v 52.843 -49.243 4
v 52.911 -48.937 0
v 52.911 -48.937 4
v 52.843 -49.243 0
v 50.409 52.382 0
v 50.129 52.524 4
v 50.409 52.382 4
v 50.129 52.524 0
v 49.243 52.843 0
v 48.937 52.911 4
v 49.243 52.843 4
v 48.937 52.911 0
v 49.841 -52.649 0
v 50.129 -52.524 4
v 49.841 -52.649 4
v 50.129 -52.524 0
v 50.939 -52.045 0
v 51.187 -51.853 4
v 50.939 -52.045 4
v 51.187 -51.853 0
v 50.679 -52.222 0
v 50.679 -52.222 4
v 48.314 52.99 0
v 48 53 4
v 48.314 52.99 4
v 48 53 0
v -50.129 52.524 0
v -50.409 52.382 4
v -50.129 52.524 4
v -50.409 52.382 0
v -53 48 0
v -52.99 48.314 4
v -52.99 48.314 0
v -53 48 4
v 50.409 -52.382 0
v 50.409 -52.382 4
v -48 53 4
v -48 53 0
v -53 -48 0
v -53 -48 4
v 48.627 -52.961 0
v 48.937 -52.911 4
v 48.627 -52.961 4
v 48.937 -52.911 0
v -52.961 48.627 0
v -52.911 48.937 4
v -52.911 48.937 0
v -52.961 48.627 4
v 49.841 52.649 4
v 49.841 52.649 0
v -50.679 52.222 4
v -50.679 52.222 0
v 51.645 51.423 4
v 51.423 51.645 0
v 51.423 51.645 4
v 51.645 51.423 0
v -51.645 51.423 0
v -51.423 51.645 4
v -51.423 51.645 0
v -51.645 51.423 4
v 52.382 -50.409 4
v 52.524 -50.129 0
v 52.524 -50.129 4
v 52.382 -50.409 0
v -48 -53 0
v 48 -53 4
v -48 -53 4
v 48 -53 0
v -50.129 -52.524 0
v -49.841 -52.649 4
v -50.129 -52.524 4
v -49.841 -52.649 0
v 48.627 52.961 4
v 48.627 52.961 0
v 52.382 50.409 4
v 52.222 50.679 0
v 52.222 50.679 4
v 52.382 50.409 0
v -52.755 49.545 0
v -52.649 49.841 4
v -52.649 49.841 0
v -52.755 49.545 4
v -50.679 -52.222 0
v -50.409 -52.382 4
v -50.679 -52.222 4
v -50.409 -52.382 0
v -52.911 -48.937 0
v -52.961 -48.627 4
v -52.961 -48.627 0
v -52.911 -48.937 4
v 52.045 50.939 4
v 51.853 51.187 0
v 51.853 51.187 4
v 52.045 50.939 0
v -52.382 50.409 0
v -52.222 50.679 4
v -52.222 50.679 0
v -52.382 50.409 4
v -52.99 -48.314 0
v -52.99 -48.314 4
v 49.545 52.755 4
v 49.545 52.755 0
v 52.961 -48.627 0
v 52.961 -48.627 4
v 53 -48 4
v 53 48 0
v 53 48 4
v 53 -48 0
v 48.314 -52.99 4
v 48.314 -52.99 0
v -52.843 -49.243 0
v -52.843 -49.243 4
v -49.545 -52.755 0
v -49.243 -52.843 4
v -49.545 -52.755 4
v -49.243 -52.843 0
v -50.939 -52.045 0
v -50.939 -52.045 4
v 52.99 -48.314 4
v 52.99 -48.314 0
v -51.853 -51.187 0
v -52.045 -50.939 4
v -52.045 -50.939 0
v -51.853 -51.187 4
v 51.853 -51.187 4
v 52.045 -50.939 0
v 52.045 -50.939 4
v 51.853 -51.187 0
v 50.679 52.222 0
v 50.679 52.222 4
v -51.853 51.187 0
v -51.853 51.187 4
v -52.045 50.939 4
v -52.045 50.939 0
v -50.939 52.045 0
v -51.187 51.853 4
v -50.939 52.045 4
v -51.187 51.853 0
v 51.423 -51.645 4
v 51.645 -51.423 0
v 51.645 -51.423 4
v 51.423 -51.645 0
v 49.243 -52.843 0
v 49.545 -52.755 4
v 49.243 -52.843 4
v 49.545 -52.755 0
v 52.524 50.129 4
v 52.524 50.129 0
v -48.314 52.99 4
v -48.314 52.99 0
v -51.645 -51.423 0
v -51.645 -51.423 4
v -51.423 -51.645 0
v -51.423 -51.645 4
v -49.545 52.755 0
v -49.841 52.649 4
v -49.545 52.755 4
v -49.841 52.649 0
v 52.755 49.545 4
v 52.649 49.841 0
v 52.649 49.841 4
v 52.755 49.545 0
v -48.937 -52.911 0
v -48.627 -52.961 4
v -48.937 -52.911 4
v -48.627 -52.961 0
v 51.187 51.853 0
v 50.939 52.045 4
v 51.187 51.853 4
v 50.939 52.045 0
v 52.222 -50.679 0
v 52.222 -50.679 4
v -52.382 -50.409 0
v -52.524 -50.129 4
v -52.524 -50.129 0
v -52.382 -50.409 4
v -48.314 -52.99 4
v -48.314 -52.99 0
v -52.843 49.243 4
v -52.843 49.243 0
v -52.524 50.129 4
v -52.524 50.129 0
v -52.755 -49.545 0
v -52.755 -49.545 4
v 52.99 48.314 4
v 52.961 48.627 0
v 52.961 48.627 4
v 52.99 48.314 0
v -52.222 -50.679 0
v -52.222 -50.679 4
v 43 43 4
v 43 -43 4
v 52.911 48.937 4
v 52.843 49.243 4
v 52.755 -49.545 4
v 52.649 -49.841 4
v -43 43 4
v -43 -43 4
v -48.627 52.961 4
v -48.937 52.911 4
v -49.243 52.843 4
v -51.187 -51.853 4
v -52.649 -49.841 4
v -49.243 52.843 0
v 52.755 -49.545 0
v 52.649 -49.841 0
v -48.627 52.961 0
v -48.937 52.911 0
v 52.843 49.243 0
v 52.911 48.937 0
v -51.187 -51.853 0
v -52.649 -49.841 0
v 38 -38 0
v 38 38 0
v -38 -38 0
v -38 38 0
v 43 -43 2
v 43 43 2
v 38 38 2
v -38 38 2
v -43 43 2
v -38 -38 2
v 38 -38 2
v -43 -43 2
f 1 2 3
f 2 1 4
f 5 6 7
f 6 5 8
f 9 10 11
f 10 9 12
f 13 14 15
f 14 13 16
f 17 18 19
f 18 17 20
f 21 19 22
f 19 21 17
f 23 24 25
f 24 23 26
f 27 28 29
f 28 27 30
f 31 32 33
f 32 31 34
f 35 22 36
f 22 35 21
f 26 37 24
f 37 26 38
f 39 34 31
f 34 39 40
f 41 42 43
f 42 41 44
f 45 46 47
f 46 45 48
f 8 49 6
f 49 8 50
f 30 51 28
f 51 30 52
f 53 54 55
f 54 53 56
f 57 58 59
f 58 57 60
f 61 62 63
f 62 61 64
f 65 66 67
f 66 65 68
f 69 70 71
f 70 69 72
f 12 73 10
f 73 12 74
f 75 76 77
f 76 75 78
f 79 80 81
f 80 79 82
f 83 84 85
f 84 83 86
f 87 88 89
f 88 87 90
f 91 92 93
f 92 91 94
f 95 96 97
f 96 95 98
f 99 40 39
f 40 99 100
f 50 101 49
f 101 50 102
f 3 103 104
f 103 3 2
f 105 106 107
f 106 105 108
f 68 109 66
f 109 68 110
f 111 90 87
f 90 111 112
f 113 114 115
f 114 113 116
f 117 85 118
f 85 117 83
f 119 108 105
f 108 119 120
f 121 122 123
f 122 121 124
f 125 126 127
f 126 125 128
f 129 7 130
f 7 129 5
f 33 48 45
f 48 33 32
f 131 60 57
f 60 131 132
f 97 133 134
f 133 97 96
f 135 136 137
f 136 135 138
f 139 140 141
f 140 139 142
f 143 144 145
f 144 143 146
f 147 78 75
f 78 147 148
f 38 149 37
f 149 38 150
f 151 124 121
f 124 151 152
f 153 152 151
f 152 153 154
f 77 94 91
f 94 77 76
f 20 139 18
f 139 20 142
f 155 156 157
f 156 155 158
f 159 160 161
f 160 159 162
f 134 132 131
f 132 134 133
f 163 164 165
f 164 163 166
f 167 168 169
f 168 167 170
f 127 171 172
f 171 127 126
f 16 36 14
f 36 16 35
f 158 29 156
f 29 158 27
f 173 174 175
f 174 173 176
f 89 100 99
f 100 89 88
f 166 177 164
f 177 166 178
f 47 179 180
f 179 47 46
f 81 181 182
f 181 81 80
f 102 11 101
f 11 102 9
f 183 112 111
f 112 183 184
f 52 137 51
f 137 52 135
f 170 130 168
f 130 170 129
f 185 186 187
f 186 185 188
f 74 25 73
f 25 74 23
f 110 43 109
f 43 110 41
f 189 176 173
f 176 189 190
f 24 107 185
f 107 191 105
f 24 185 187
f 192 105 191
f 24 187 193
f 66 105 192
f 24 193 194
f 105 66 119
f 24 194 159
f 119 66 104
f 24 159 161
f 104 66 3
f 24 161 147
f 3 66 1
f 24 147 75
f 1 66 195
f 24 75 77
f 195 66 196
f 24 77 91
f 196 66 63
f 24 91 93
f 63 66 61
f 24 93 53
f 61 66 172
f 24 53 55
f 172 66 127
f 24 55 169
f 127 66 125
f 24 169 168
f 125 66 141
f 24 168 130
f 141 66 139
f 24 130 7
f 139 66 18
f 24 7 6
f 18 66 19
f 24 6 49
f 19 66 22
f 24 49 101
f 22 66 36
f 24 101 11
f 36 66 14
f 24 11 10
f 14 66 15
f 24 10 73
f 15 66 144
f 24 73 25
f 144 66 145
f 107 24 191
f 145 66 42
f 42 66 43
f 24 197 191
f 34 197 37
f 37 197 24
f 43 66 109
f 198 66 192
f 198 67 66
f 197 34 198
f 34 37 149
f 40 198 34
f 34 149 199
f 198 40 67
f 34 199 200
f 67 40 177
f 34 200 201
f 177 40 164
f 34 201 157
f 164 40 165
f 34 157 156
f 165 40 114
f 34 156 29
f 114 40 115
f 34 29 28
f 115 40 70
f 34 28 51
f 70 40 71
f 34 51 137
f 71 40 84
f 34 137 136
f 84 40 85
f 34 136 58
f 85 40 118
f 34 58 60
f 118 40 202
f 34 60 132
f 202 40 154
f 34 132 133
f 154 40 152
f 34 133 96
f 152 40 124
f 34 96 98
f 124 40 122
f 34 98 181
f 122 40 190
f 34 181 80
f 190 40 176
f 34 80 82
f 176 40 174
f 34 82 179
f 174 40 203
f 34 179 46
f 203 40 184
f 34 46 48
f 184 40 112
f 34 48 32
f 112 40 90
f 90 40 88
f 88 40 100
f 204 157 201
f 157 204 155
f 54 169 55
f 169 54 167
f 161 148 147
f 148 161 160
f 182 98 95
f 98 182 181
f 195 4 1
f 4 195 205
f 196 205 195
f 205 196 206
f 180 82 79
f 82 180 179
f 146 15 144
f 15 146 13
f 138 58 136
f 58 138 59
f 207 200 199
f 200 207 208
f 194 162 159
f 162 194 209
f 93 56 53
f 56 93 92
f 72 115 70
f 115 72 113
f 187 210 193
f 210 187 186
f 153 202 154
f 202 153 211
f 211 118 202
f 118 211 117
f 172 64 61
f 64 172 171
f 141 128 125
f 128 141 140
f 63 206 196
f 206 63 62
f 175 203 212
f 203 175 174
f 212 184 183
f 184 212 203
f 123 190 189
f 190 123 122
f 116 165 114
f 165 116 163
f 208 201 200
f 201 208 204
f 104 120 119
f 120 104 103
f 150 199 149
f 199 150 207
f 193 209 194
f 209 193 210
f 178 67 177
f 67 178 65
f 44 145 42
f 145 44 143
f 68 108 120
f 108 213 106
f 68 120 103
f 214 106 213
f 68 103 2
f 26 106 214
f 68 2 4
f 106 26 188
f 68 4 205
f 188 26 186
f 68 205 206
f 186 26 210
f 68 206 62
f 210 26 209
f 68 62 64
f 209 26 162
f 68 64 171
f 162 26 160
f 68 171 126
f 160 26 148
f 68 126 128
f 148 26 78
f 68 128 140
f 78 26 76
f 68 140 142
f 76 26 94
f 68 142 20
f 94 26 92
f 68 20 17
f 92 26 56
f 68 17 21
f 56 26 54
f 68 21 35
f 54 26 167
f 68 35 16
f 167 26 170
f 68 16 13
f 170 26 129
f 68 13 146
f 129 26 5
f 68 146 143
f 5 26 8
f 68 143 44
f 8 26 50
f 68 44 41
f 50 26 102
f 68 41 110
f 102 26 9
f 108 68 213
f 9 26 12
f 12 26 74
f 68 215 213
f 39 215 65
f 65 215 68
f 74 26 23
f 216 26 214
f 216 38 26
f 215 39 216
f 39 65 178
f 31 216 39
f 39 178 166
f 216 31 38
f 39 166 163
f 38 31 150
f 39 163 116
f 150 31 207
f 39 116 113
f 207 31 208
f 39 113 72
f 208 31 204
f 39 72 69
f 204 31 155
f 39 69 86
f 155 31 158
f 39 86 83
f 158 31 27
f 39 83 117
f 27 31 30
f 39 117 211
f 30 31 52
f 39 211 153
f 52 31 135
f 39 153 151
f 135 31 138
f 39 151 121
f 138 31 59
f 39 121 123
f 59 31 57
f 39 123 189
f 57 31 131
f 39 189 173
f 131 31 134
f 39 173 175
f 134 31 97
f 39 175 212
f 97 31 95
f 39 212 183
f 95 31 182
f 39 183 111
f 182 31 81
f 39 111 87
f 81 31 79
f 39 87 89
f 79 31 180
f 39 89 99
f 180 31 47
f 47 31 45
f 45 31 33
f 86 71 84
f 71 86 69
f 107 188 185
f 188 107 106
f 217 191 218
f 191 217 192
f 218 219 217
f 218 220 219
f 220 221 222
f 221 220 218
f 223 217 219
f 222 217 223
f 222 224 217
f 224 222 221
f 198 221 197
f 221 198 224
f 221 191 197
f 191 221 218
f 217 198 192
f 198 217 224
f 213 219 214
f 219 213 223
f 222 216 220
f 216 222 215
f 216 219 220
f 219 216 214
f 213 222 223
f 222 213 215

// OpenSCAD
$width=86;
$height=86;
$thickness=3;
$xy_offset=10;
$inner_xy_offset=5;
$z_offset=1;
$outer_rounding_radius=5;

$fn=100;
difference(){
//frame    
translate([0,0,$thickness/2]){
minkowski() {
cube([$width-2*$outer_rounding_radius+2*$xy_offset,$height-2*$outer_rounding_radius+2*$xy_offset,$thickness], center= true);
cylinder(r=$outer_rounding_radius,h=1);
};
};
//offset
translate([0,0,$thickness-$z_offset+($thickness-$z_offset)/2])cube([$width,$height,$thickness-$z_offset], center= true);

//hole
translate([0,0,$thickness/2])cube([$width-2*$inner_xy_offset,$height-2*$inner_xy_offset,$thickness], center= true);
};
